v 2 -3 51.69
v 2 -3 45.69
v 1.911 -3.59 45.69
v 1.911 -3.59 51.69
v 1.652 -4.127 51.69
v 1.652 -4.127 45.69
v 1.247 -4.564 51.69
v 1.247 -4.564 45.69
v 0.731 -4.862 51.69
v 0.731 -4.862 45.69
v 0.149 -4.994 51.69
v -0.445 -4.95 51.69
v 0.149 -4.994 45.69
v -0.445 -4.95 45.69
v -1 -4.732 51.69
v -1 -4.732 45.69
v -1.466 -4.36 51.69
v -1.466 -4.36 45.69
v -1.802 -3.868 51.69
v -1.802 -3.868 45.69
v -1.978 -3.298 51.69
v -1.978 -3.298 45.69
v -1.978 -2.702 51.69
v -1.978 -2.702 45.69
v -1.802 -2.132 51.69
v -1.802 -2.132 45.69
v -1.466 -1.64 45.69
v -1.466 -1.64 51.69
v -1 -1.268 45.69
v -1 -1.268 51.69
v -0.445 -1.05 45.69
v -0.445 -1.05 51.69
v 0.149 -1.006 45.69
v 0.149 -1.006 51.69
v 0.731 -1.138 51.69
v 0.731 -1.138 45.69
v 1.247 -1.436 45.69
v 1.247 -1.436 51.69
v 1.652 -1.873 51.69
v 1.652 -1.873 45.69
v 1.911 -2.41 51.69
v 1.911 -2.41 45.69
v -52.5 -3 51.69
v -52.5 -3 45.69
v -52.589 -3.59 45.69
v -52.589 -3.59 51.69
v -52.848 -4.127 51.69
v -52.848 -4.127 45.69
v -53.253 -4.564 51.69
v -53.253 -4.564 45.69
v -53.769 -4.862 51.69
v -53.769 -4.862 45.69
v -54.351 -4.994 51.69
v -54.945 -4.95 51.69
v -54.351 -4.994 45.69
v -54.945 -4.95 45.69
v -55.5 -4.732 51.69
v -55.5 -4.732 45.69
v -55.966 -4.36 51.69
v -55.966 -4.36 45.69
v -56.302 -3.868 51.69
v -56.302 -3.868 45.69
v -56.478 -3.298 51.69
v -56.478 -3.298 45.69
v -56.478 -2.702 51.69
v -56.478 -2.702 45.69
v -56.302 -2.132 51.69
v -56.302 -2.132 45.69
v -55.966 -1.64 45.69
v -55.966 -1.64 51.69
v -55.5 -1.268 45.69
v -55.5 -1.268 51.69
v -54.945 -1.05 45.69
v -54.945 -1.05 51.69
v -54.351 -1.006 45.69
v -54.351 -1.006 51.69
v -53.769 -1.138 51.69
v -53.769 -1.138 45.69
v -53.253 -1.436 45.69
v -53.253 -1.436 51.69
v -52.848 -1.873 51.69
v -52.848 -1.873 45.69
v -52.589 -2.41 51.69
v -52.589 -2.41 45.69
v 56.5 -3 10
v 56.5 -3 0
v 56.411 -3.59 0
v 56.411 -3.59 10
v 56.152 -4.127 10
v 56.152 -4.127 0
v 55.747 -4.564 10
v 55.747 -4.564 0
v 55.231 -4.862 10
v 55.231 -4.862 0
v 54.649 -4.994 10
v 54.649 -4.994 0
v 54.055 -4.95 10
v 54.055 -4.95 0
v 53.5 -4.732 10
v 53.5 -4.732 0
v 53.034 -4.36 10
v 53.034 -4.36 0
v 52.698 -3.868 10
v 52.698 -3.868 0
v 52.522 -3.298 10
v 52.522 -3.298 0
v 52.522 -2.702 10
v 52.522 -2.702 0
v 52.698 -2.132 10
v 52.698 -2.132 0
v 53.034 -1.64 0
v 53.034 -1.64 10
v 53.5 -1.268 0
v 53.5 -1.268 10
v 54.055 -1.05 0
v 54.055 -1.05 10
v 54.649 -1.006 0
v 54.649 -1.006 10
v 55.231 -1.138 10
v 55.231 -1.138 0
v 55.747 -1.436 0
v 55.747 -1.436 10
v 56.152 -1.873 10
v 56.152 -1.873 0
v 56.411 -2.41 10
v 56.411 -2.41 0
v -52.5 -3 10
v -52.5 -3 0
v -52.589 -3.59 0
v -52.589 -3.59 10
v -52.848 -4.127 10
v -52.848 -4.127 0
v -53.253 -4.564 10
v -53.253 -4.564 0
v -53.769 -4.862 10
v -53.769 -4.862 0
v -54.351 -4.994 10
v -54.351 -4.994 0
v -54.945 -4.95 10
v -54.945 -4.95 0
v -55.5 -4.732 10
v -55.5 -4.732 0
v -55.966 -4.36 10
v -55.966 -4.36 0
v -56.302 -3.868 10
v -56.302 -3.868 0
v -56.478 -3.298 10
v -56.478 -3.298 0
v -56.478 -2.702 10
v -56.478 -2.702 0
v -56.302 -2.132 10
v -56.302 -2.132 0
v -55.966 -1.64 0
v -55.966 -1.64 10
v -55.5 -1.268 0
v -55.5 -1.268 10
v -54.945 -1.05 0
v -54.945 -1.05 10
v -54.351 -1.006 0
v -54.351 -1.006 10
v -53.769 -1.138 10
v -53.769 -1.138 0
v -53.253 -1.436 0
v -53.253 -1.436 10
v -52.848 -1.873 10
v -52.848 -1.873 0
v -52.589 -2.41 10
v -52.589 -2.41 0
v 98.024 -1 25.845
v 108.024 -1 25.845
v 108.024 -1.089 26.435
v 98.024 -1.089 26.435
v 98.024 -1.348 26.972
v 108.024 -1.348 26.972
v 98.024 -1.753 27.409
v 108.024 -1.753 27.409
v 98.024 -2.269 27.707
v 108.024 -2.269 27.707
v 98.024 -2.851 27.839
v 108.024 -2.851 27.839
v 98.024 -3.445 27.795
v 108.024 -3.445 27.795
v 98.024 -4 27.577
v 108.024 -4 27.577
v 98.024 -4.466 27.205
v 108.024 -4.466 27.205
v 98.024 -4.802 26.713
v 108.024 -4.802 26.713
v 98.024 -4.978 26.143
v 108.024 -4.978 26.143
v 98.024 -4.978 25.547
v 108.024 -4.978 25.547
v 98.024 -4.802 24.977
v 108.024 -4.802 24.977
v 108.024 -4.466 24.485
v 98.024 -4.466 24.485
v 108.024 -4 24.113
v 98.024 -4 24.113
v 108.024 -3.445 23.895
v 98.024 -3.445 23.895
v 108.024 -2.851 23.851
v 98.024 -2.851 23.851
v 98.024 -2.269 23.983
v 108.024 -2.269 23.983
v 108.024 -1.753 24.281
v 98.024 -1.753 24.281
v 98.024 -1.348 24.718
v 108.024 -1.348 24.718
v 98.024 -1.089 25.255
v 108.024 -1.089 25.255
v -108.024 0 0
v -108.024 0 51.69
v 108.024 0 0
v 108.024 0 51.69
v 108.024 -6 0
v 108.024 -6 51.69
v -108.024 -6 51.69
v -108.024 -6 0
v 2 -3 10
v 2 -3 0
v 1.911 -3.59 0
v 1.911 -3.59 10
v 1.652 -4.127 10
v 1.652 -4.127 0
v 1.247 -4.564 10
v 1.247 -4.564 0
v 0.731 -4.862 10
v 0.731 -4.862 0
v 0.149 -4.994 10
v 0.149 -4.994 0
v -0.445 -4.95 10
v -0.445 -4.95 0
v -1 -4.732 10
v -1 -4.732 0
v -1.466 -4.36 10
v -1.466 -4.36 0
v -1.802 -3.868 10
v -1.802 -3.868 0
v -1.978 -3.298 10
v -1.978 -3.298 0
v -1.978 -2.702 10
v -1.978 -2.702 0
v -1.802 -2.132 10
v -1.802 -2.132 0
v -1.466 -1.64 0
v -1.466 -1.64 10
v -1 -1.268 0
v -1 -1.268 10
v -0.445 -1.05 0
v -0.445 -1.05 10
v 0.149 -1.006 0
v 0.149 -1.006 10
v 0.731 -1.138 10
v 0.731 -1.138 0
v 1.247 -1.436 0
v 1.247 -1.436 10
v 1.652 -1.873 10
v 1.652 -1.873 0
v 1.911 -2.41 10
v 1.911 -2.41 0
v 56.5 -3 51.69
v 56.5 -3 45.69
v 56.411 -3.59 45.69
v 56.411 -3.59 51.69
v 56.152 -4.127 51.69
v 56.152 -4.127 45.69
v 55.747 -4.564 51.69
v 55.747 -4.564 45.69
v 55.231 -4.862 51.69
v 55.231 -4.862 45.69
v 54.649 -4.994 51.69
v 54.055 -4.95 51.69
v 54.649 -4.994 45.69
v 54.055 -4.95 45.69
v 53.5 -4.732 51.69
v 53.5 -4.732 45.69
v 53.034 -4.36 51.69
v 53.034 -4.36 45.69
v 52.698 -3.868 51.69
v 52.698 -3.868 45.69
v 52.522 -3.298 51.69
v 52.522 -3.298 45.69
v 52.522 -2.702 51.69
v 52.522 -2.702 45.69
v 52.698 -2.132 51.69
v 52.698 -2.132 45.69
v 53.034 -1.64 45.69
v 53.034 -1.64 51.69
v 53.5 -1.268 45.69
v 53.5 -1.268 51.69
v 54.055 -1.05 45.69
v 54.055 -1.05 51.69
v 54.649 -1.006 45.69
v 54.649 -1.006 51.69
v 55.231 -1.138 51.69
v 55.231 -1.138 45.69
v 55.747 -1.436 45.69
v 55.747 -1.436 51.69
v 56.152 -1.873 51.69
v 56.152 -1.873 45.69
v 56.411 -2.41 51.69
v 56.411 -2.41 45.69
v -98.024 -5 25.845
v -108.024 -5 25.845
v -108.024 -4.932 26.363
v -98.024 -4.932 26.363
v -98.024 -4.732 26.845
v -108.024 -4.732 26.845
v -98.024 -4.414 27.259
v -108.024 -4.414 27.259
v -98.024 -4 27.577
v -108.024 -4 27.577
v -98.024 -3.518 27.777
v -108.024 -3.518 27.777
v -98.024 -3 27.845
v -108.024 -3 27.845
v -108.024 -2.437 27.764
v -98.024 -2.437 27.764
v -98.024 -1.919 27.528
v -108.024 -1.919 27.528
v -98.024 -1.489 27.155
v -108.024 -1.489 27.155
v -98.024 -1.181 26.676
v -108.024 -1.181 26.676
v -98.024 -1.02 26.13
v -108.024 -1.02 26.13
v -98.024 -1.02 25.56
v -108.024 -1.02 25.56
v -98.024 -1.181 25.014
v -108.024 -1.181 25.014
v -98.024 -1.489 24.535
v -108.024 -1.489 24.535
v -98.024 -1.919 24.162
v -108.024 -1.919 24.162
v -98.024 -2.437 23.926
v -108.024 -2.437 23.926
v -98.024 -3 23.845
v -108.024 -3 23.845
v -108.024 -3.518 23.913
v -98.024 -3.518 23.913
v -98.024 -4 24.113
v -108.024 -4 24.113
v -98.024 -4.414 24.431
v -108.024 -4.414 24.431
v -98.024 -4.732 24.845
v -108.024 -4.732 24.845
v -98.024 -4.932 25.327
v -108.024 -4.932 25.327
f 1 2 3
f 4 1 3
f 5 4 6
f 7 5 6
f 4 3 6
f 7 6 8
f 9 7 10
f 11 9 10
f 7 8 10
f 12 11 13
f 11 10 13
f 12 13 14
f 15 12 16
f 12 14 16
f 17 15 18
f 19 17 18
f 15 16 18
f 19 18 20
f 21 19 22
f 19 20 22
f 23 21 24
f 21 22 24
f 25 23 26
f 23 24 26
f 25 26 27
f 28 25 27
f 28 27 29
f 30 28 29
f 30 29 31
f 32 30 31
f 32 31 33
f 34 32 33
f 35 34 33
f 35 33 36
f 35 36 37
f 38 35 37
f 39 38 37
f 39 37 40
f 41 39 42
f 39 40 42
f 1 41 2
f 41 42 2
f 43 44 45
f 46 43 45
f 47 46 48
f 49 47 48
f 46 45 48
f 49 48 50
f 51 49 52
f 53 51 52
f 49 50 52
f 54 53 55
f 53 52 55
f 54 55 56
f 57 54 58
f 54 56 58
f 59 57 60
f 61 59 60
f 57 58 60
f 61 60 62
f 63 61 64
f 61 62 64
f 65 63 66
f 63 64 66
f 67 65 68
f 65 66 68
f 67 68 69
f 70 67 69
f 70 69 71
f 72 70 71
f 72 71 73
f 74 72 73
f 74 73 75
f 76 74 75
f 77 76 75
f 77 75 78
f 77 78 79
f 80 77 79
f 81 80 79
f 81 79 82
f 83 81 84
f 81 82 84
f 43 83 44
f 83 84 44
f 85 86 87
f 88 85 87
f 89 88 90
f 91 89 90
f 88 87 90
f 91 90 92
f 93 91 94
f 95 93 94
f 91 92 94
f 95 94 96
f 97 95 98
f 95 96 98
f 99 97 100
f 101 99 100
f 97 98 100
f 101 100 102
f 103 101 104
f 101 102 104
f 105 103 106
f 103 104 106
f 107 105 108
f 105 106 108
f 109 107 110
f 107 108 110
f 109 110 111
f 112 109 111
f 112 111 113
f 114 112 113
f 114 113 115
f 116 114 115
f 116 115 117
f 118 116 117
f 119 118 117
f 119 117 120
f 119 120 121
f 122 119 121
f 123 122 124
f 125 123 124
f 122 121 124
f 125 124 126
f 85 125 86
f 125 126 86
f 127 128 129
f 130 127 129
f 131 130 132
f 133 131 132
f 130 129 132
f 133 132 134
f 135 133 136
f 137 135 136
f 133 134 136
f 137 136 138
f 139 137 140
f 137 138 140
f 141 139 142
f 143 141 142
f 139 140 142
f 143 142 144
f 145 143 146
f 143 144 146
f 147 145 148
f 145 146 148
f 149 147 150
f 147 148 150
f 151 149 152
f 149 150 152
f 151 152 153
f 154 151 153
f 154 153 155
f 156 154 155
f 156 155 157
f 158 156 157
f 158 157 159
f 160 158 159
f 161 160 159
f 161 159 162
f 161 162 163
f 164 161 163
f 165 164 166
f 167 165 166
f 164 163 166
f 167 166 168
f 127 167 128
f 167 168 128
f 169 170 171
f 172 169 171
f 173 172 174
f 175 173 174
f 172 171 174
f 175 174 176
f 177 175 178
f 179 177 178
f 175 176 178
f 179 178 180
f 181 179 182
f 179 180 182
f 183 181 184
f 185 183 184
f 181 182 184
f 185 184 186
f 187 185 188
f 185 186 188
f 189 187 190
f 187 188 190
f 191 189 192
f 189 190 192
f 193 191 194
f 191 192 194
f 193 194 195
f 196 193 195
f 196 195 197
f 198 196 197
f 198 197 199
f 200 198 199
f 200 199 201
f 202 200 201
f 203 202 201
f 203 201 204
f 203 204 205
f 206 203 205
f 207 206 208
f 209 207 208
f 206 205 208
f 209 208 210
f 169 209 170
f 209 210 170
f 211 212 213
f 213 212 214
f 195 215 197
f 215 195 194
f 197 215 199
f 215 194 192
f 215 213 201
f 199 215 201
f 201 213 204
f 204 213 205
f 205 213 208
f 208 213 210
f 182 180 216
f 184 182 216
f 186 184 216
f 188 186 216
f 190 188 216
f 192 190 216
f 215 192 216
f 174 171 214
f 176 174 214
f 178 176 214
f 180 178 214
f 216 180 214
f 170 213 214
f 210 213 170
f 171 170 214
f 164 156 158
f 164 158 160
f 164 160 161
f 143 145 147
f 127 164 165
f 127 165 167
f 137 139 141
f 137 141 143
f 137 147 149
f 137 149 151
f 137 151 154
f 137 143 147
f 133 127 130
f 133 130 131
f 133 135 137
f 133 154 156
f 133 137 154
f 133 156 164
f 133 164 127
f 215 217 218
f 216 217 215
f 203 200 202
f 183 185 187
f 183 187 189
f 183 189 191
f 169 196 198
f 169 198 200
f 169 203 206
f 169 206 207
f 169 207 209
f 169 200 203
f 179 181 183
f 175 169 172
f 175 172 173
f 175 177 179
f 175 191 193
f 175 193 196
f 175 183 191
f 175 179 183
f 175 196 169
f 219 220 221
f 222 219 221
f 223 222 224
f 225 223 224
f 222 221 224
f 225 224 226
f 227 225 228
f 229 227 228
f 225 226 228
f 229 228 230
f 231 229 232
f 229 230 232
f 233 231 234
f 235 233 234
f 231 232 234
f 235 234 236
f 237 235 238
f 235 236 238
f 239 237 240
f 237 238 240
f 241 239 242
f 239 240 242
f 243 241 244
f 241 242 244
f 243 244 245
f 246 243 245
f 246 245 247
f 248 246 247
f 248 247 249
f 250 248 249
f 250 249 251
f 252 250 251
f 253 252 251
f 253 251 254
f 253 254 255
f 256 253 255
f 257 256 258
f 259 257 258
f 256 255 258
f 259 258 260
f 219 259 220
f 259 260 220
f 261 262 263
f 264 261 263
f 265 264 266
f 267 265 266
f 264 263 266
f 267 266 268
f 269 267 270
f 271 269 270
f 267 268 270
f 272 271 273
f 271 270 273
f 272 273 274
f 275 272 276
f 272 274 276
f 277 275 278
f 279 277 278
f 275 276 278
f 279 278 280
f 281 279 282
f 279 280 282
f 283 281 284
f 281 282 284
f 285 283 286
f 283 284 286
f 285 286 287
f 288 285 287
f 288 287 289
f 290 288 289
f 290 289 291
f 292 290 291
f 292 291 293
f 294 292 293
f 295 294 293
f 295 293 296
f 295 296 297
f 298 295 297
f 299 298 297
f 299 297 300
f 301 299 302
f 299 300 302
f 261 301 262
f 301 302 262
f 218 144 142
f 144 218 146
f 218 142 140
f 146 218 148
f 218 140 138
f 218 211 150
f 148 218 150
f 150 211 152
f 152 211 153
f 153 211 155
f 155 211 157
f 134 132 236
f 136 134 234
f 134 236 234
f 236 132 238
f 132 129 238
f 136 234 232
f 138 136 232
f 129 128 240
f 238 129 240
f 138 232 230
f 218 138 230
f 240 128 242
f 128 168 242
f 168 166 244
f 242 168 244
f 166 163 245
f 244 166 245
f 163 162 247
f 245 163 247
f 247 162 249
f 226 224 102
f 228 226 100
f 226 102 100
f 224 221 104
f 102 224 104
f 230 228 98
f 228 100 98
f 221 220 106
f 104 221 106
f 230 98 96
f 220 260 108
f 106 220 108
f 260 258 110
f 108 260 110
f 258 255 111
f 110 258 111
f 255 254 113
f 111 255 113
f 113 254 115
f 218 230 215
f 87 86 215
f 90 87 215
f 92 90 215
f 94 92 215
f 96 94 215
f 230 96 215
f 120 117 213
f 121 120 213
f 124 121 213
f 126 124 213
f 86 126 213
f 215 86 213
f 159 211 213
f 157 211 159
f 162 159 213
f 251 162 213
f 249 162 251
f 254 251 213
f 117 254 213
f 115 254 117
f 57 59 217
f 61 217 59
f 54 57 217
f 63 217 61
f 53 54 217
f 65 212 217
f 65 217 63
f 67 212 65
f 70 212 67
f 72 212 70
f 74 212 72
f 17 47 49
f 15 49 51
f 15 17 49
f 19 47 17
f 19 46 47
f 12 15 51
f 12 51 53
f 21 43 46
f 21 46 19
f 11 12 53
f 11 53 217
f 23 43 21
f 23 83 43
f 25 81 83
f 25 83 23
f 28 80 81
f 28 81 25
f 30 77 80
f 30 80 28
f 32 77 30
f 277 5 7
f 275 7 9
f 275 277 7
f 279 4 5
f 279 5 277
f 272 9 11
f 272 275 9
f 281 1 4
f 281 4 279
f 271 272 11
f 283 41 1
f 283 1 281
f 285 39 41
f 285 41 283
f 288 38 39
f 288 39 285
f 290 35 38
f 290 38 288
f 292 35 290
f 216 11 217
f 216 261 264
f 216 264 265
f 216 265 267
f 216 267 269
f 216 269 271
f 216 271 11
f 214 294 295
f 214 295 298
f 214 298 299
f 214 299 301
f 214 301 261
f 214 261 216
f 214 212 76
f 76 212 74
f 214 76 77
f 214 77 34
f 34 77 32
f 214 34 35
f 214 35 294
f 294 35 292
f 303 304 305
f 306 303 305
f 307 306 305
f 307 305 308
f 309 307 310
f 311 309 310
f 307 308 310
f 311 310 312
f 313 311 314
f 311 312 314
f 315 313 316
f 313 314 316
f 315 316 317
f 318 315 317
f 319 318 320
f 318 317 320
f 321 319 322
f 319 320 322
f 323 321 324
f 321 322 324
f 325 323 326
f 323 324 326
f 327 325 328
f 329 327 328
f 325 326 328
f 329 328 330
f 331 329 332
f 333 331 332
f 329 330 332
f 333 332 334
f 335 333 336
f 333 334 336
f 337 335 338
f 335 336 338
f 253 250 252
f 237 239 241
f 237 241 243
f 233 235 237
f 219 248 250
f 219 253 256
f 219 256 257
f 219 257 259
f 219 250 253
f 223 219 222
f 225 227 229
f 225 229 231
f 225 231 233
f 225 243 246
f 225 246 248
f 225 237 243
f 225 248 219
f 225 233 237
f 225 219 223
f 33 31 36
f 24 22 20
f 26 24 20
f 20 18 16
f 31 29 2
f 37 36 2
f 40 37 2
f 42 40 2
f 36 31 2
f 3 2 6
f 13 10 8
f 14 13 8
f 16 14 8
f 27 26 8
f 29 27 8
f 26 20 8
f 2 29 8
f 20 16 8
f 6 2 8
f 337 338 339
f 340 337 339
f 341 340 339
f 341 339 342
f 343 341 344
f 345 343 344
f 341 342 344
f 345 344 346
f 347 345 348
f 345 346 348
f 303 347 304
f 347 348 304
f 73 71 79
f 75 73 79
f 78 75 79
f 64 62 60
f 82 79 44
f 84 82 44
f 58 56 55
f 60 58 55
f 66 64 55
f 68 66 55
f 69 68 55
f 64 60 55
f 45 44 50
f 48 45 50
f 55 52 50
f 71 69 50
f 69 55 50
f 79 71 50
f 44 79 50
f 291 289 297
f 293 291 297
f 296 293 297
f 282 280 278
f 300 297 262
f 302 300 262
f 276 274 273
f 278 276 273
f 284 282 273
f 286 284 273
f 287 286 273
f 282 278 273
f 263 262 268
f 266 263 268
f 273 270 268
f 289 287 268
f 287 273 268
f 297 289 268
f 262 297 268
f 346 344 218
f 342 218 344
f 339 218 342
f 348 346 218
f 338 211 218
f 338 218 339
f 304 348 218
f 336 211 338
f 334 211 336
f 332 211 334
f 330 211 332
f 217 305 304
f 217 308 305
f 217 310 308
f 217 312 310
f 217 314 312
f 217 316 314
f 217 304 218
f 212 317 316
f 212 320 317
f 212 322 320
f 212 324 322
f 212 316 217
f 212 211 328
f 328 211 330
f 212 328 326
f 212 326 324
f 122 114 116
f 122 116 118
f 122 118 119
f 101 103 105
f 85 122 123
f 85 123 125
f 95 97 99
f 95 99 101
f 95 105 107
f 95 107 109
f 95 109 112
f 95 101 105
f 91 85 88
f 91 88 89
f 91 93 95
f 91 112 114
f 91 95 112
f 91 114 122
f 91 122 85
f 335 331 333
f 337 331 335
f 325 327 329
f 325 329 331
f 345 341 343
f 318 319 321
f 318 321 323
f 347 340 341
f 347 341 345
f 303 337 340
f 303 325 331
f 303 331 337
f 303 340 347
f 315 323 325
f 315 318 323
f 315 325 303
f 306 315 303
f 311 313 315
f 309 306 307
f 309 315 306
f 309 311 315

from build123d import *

# Parameters (mm, degrees)
F0_W     = 216.049
F0_H     = 51.69
F1_DEPTH = 6
F2_R     = 2
F3_DEPTH = 10
F5_DEPTH = 10
F6_START = -45.69
F6_DEPTH = 6
F7_DEPTH = 10
F8_R     = 2
F9_DEPTH = 10


with BuildPart() as f1:
    # F0 (on Front) → F1 (new body)
    with BuildSketch(Plane.XZ):
        with Locations((0, 25.845)):
            Rectangle(F0_W, F0_H)
    extrude(amount=F1_DEPTH)

    # F2 (on face) → F3 (cut)
    with BuildSketch(Plane(origin=(0, 0, 0), x_dir=(1, 0, 0), z_dir=(0, 0, -1))):
        with Locations((0, 3)):
            Circle(F2_R)
        with Locations((-54.5, 3)):
            Circle(F2_R)
        with Locations((54.5, 3)):
            Circle(F2_R)
    extrude(amount=-F3_DEPTH, mode=Mode.SUBTRACT)

    # F4 (on face) → F5 (join)
    with BuildSketch(Plane(origin=(-108.0245, 0, 0), x_dir=(0, -1, 0), z_dir=(-1, 0, 0))):
        with BuildLine():
            ThreePointArc((5, 25.845), (4.4142135624, 27.2592135624), (3, 27.845))
            Line((3, 27.845), (3, 23.845))
            ThreePointArc((3, 23.845), (4.4142135624, 24.4307864376), (5, 25.845))
        make_face()
        with BuildLine():
            Line((3, 23.845), (3, 27.845))
            ThreePointArc((3, 27.845), (1, 25.845), (3, 23.845))
        make_face()
    extrude(amount=-F5_DEPTH)

    # F2 (on face) → F6 (cut)
    with BuildSketch(Plane(origin=(0, 0, 0), x_dir=(1, 0, 0), z_dir=(0, 0, -1)).offset(F6_START)):
        with Locations((0, 3)):
            Circle(F2_R)
        with Locations((-54.5, 3)):
            Circle(F2_R)
        with Locations((54.5, 3)):
            Circle(F2_R)
    extrude(amount=-F6_DEPTH, mode=Mode.SUBTRACT)

    # F4 (on face) → F7 (cut)
    with BuildSketch(Plane(origin=(-108.0245, 0, 0), x_dir=(0, -1, 0), z_dir=(-1, 0, 0))):
        with BuildLine():
            Line((3, 23.845), (3, 27.845))
            ThreePointArc((3, 27.845), (1, 25.845), (3, 23.845))
        make_face()
        with BuildLine():
            ThreePointArc((5, 25.845), (4.4142135624, 27.2592135624), (3, 27.845))
            Line((3, 27.845), (3, 23.845))
            ThreePointArc((3, 23.845), (4.4142135624, 24.4307864376), (5, 25.845))
        make_face()
    extrude(amount=-F7_DEPTH, mode=Mode.SUBTRACT)

    # F8 (on face) → F9 (cut)
    with BuildSketch(Plane.YZ.offset(108.0245)):
        with Locations((-3, 25.845)):
            Circle(F8_R)
    extrude(amount=-F9_DEPTH, mode=Mode.SUBTRACT)


solid = f1.part
